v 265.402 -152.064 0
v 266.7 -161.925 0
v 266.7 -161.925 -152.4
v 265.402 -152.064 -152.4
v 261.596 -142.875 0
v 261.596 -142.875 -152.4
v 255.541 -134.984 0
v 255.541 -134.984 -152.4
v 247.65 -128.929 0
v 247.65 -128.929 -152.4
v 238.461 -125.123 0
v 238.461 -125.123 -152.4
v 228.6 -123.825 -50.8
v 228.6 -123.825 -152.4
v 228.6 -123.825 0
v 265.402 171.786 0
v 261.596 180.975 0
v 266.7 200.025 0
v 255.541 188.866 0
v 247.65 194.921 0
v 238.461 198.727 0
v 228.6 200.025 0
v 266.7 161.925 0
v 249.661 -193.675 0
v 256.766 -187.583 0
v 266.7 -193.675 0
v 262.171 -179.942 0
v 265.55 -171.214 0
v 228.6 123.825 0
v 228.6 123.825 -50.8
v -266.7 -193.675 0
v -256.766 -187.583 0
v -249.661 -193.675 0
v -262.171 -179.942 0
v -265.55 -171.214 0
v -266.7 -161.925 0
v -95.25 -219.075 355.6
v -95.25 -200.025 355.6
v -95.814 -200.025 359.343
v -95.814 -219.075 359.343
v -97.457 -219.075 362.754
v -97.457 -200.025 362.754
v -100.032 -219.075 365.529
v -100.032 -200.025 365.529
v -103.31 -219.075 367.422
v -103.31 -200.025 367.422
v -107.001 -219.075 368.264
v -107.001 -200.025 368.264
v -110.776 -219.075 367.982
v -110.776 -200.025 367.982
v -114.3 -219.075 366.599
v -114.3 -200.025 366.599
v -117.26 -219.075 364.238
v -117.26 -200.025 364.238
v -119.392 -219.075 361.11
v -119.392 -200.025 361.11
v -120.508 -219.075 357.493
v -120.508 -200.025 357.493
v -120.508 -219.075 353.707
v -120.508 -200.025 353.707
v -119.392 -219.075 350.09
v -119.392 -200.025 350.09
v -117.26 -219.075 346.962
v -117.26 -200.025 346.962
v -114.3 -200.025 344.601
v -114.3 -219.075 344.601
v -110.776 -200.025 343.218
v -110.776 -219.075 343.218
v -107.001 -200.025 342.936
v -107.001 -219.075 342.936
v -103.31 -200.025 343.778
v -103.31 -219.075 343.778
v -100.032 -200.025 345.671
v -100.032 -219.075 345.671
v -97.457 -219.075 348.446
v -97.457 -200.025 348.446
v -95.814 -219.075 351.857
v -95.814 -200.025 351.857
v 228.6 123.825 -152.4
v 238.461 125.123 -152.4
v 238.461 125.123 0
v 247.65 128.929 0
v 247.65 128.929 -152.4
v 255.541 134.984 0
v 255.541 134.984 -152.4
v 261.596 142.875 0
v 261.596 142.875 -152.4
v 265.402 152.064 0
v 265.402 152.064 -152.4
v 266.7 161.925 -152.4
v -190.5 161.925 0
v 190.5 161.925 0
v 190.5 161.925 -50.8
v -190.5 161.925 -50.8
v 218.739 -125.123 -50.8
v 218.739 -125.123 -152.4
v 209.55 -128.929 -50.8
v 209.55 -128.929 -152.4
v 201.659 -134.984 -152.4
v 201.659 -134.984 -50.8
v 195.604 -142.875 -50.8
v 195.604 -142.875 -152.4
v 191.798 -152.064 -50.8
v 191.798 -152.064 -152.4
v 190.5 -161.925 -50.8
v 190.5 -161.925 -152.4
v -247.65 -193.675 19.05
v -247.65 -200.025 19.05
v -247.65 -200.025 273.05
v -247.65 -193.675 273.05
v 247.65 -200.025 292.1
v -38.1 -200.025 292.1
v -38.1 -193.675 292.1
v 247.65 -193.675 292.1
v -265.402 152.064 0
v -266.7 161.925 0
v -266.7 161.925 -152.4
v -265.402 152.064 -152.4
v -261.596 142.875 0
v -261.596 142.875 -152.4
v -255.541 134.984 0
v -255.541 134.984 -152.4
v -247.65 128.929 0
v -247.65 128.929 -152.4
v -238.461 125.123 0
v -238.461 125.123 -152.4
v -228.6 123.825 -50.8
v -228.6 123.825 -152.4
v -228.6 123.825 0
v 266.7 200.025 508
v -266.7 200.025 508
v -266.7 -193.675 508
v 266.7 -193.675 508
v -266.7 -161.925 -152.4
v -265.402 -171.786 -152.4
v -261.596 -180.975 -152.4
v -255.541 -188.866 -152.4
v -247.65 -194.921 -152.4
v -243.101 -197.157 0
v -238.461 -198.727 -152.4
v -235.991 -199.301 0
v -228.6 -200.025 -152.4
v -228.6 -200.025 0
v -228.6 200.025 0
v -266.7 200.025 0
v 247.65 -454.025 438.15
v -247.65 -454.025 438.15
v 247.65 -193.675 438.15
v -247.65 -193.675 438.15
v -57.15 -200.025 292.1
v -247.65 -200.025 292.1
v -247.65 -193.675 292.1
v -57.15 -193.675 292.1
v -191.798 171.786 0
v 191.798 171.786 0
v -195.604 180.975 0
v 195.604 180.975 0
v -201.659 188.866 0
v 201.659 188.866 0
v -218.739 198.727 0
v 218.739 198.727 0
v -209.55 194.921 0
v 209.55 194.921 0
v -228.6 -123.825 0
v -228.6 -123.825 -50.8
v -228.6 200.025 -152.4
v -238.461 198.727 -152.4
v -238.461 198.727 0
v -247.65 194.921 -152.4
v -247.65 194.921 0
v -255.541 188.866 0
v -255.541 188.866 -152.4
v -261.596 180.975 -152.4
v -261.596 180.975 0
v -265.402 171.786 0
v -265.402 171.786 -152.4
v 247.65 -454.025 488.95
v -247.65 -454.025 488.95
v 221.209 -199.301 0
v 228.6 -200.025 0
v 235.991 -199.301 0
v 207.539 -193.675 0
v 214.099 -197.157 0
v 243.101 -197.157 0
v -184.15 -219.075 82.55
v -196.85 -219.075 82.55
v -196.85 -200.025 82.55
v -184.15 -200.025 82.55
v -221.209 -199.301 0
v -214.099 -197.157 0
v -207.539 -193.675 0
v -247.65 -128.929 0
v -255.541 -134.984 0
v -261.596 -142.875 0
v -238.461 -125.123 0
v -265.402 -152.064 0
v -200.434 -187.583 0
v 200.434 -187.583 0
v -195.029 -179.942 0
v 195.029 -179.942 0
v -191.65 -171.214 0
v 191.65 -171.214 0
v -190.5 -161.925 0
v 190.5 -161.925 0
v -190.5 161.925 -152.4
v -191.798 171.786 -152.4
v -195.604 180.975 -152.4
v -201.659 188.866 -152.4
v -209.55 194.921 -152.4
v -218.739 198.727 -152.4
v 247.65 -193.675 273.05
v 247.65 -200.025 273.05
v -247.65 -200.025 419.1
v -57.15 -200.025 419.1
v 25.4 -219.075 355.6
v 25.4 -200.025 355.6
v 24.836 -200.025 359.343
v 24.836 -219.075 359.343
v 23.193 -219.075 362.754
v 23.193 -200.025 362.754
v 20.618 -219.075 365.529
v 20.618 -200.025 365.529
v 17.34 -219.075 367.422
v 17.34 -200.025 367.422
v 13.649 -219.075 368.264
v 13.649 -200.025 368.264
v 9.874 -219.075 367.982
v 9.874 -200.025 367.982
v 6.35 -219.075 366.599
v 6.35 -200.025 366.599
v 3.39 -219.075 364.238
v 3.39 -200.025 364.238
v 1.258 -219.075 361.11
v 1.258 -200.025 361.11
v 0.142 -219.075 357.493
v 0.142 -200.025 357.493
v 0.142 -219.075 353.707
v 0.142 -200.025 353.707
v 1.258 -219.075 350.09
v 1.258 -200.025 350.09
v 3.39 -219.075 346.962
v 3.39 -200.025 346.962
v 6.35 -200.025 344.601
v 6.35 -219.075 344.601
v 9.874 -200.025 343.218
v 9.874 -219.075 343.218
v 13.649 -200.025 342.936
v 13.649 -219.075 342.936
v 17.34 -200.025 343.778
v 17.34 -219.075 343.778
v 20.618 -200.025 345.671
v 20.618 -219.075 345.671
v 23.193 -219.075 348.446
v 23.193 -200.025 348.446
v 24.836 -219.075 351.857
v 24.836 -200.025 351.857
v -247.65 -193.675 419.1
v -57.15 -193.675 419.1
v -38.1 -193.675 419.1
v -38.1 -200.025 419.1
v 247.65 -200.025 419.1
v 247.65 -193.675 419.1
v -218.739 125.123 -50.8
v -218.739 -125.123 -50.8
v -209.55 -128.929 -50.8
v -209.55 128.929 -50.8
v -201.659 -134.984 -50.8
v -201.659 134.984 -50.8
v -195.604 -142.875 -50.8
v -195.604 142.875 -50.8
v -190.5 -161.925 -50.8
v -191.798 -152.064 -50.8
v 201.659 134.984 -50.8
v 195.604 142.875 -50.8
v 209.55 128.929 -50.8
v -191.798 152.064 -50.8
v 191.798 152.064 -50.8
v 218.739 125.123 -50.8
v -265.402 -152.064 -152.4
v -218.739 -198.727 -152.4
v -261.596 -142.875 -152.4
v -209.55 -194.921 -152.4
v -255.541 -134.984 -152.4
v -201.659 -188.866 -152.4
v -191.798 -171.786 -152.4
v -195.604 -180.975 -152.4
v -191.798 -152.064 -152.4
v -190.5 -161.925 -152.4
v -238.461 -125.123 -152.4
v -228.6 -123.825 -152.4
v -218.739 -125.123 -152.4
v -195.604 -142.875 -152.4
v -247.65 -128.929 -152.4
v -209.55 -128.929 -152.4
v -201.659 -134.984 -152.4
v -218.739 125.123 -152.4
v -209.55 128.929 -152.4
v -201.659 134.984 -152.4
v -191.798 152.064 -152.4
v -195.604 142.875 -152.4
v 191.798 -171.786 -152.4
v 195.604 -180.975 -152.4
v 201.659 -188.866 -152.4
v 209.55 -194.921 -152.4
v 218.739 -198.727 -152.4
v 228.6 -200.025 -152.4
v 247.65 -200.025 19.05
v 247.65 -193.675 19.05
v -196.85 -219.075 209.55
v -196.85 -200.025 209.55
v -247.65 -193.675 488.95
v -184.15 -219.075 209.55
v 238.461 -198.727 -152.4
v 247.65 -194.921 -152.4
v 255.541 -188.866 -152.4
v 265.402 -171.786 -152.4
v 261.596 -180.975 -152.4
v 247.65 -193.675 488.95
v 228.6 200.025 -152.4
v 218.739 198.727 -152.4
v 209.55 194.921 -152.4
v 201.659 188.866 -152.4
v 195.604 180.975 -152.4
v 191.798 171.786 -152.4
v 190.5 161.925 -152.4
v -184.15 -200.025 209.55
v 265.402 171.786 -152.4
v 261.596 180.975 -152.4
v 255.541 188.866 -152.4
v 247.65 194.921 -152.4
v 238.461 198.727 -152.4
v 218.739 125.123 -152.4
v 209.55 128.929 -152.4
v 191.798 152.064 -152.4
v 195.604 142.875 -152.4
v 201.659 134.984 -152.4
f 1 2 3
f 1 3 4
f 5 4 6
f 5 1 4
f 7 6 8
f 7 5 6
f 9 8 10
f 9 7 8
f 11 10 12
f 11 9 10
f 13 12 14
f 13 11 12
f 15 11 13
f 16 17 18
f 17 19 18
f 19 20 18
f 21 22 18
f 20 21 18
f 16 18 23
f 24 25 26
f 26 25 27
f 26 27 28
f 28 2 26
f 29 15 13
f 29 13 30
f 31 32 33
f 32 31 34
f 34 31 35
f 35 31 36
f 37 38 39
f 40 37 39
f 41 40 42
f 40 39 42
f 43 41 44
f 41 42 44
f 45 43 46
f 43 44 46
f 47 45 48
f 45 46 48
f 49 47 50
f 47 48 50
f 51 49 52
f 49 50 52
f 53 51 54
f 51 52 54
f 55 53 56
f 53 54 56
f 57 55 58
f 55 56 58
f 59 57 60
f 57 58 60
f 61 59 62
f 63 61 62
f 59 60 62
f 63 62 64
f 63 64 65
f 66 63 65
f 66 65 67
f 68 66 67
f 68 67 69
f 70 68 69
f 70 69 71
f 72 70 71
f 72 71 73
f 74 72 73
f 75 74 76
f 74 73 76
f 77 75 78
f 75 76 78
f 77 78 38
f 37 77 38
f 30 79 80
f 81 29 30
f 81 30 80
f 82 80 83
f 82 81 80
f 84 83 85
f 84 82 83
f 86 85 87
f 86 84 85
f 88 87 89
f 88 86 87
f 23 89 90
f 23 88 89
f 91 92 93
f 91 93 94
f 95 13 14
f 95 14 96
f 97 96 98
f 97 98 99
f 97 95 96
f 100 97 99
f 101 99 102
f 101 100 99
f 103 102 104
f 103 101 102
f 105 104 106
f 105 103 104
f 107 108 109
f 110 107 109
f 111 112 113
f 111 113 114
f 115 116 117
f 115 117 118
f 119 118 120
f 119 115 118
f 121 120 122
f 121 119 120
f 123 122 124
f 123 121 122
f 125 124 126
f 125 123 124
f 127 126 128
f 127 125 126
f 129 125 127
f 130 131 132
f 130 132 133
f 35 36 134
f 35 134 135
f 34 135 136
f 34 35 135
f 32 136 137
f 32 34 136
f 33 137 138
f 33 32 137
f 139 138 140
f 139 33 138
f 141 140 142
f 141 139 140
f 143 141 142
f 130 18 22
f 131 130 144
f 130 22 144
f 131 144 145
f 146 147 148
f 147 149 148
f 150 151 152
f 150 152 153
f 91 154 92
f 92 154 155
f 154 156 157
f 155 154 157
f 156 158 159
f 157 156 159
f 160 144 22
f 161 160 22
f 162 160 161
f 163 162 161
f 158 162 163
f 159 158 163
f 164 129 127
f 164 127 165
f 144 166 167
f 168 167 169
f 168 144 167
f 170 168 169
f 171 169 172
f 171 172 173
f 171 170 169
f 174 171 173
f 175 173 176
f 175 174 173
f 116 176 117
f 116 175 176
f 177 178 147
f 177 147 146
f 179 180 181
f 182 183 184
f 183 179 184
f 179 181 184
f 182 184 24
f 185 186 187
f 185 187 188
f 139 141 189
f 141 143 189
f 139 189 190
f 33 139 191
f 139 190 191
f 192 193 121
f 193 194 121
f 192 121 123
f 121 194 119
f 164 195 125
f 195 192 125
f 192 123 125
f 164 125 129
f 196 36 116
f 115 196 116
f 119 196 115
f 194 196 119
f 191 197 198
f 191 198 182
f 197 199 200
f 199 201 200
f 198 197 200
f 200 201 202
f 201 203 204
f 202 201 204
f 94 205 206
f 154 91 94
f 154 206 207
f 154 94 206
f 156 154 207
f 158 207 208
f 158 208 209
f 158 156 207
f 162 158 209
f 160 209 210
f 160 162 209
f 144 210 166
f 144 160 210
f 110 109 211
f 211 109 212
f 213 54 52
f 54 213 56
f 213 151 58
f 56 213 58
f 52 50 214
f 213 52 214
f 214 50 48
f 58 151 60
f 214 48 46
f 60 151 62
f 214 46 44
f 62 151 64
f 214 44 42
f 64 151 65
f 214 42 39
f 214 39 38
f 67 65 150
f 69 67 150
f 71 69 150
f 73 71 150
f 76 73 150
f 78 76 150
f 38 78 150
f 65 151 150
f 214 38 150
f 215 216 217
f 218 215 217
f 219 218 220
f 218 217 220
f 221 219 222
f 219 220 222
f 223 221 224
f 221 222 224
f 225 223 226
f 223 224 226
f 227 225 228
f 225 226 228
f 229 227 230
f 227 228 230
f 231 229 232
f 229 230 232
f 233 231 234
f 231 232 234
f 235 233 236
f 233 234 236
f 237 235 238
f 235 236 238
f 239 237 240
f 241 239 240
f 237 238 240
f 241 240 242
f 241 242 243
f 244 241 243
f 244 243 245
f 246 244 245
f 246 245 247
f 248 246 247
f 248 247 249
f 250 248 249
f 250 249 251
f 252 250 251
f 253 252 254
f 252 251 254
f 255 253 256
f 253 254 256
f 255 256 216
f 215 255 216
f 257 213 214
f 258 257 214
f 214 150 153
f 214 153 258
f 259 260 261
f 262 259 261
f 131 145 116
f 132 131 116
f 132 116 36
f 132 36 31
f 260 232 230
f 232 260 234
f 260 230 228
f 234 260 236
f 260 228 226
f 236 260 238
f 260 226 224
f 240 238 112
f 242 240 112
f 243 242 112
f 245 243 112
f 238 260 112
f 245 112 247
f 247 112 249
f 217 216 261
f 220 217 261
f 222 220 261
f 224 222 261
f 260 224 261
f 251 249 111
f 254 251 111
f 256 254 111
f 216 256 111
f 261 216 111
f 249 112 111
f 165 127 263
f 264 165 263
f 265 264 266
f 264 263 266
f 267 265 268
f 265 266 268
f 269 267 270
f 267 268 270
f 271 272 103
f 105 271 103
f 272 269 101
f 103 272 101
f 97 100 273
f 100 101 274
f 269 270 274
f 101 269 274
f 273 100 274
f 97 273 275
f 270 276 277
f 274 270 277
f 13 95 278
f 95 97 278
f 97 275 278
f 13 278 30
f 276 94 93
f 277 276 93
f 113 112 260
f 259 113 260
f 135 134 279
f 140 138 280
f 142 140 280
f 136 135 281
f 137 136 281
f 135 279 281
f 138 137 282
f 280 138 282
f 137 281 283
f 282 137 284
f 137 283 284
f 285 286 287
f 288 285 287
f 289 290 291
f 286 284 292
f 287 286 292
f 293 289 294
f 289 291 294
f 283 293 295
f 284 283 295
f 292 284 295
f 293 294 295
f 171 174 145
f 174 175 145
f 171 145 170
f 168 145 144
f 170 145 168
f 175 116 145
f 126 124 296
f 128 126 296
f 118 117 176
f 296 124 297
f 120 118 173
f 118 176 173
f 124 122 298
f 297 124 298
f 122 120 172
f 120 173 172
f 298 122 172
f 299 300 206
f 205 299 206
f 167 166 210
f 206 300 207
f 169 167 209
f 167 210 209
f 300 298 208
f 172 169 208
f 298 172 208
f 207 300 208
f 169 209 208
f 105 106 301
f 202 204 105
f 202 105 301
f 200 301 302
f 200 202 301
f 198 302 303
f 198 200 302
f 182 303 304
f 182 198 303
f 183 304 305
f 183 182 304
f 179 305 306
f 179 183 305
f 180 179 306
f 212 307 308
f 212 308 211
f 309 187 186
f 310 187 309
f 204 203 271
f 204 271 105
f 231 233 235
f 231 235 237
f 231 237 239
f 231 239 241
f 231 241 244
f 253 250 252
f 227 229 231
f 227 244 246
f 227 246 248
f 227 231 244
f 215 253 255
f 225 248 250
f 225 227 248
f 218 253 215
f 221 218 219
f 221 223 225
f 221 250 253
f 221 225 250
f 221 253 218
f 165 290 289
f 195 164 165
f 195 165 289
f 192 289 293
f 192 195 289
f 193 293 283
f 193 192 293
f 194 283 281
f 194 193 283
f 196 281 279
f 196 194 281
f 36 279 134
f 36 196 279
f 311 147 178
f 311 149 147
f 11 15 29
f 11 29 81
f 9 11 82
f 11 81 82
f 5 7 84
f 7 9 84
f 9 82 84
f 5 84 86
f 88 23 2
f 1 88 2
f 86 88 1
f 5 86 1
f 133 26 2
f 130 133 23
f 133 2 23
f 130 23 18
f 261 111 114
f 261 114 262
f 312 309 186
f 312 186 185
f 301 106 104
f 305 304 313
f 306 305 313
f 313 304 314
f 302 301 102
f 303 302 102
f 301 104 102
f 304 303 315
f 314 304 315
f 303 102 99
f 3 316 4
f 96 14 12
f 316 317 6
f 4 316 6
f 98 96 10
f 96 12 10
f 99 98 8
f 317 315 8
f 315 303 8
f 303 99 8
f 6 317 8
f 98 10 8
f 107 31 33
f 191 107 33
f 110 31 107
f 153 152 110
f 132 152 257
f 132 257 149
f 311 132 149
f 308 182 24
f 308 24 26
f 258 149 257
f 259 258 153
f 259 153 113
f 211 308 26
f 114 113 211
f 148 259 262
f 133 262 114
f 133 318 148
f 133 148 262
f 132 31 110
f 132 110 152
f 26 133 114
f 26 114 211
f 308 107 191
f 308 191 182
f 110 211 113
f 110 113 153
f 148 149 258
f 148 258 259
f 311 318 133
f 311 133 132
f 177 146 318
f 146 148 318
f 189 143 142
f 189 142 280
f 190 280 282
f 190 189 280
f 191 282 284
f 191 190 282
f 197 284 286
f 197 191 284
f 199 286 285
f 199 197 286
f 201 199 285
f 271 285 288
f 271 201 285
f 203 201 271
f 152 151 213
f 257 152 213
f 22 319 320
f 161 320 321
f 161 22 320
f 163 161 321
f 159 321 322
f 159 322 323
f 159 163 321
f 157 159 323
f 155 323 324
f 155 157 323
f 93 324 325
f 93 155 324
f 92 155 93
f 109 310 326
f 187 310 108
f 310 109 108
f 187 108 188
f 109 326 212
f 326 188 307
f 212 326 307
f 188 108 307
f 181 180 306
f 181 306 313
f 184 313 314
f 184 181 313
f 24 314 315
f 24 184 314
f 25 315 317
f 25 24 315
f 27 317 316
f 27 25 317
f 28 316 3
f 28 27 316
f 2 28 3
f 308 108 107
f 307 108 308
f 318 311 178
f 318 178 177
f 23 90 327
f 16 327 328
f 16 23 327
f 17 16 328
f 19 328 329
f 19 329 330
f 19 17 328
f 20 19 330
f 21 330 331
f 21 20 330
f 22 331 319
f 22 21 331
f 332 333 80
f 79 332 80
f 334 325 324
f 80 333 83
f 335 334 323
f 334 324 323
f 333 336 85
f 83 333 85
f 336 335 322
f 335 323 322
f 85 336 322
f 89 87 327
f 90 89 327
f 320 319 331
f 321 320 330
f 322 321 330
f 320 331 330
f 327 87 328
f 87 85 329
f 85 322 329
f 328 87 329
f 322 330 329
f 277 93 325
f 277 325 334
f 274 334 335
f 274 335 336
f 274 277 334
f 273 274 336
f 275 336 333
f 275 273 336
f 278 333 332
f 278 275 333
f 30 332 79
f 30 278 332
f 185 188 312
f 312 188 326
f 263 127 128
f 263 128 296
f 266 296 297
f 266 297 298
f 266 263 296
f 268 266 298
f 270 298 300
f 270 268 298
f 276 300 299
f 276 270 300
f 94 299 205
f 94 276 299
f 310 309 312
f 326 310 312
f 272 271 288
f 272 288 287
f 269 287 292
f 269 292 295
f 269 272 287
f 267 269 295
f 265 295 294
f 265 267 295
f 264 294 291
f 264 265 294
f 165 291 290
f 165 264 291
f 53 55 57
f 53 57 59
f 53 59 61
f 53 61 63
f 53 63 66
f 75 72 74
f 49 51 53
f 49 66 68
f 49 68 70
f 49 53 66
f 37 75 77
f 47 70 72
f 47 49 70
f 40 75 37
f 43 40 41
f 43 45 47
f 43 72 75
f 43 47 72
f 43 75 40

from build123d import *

# Parameters (mm, degrees)
F1_DEPTH = 50.8
F2_DEPTH = 152.4
F3_DEPTH = 508
F4_W     = 495.3
F4_H     = 254
F4_W_2   = 190.5
F4_H_2   = 127
F4_W_3   = 285.75
F4_H_3   = 50.8
F5_DEPTH = 6.35
F6_DEPTH = 254
F4_W_4   = 12.7
F4_R     = 12.7
F7_DEPTH = 19.05


with BuildPart() as f1:
    # F0 (on Top) → F1 (new body)
    with BuildSketch(Plane.XY):
        with BuildLine():
            ThreePointArc((228.6, 123.825), (201.6592316368, 134.9842316368), (190.5, 161.925))
            Line((190.5, 161.925), (-190.5, 161.925))
            ThreePointArc((-190.5, 161.925), (-201.6592316368, 134.9842316368), (-228.6, 123.825))
            Line((-228.6, 123.825), (-228.6, -123.825))
            ThreePointArc((-228.6, -123.825), (-201.6592316368, -134.9842316368), (-190.5, -161.925))
            Line((-190.5, -161.925), (190.5, -161.925))
            ThreePointArc((190.5, -161.925), (201.6592316368, -134.9842316368), (228.6, -123.825))
            Line((228.6, -123.825), (228.6, 123.825))
        make_face()
        with BuildLine():
            ThreePointArc((-228.6, 123.825), (-201.6592316368, 134.9842316368), (-190.5, 161.925))
            Line((-190.5, 161.925), (-228.6, 161.925))
            Line((-228.6, 161.925), (-228.6, 123.825))
        make_face()
        with BuildLine():
            ThreePointArc((-190.5, -161.925), (-201.6592316368, -134.9842316368), (-228.6, -123.825))
            Line((-228.6, -123.825), (-228.6, -161.925))
            Line((-228.6, -161.925), (-190.5, -161.925))
        make_face()
        with BuildLine():
            Line((228.6, -161.925), (228.6, -123.825))
            ThreePointArc((228.6, -123.825), (201.6592316368, -134.9842316368), (190.5, -161.925))
            Line((190.5, -161.925), (228.6, -161.925))
        make_face()
        with BuildLine():
            Line((228.6, 161.925), (190.5, 161.925))
            ThreePointArc((190.5, 161.925), (201.6592316368, 134.9842316368), (228.6, 123.825))
            Line((228.6, 123.825), (228.6, 161.925))
        make_face()
    extrude(amount=-F1_DEPTH)

    # F0 (on Top) → F2 (join)
    with BuildSketch(Plane.XY):
        with BuildLine():
            ThreePointArc((-228.6, -123.825), (-255.5407683632, -134.9842316368), (-266.7, -161.925))
            ThreePointArc((-266.7, -161.925), (-255.540768159, -188.8657685674), (-228.5999994224, -200.025))
            ThreePointArc((-228.5999994224, -200.025), (-201.6592314326, -188.865768159), (-190.5, -161.925))
            Line((-190.5, -161.925), (-228.6, -161.925))
            Line((-228.6, -161.925), (-228.6, -123.825))
        make_face()
        with BuildLine():
            ThreePointArc((-190.5, -161.925), (-201.6592316368, -134.9842316368), (-228.6, -123.825))
            Line((-228.6, -123.825), (-228.6, -161.925))
            Line((-228.6, -161.925), (-190.5, -161.925))
        make_face()
        with BuildLine():
            ThreePointArc((-228.6, 123.825), (-201.6592316368, 134.9842316368), (-190.5, 161.925))
            Line((-190.5, 161.925), (-228.6, 161.925))
            Line((-228.6, 161.925), (-228.6, 123.825))
        make_face()
        with BuildLine():
            ThreePointArc((-190.5, 161.925), (-201.6592316368, 188.8657683632), (-228.6, 200.025))
            ThreePointArc((-228.6, 200.025), (-255.5407683632, 188.8657683632), (-266.7, 161.925))
            ThreePointArc((-266.7, 161.925), (-255.5407683632, 134.9842316368), (-228.6, 123.825))
            Line((-228.6, 123.825), (-228.6, 161.925))
            Line((-228.6, 161.925), (-190.5, 161.925))
        make_face()
        with BuildLine():
            Line((228.6, 161.925), (190.5, 161.925))
            ThreePointArc((190.5, 161.925), (201.6592316368, 134.9842316368), (228.6, 123.825))
            Line((228.6, 123.825), (228.6, 161.925))
        make_face()
        with BuildLine():
            ThreePointArc((266.7, 161.925), (255.5407683632, 188.8657683632), (228.6, 200.025))
            ThreePointArc((228.6, 200.025), (201.6592316368, 188.8657683632), (190.5, 161.925))
            Line((190.5, 161.925), (228.6, 161.925))
            Line((228.6, 161.925), (228.6, 123.825))
            ThreePointArc((228.6, 123.825), (255.5407683632, 134.9842316368), (266.7, 161.925))
        make_face()
        with BuildLine():
            Line((228.6, -161.925), (228.6, -123.825))
            ThreePointArc((228.6, -123.825), (201.6592316368, -134.9842316368), (190.5, -161.925))
            Line((190.5, -161.925), (228.6, -161.925))
        make_face()
        with BuildLine():
            ThreePointArc((228.6, -200.025), (255.5407683632, -188.8657683632), (266.7, -161.925))
            ThreePointArc((266.7, -161.925), (255.5407683632, -134.9842316368), (228.6, -123.825))
            Line((228.6, -123.825), (228.6, -161.925))
            Line((228.6, -161.925), (190.5, -161.925))
            ThreePointArc((190.5, -161.925), (201.6592316368, -188.8657683632), (228.6, -200.025))
        make_face()
    extrude(amount=-F2_DEPTH)

    # F0 (on Top) → F3 (join)
    with BuildSketch(Plane.XY):
        with BuildLine():
            ThreePointArc((-228.6, 123.825), (-255.5407683632, 134.9842316368), (-266.7, 161.925))
            Line((-266.7, 161.925), (-266.7, -161.925))
            ThreePointArc((-266.7, -161.925), (-255.5407683632, -134.9842316368), (-228.6, -123.825))
            Line((-228.6, -123.825), (-228.6, 123.825))
        make_face()
        with BuildLine():
            ThreePointArc((-266.7, 161.925), (-255.5407683632, 188.8657683632), (-228.6, 200.025))
            Line((-228.6, 200.025), (-266.7, 200.025))
            Line((-266.7, 200.025), (-266.7, 161.925))
        make_face()
        with BuildLine():
            ThreePointArc((-190.5, 161.925), (-201.6592316368, 188.8657683632), (-228.6, 200.025))
            ThreePointArc((-228.6, 200.025), (-255.5407683632, 188.8657683632), (-266.7, 161.925))
            ThreePointArc((-266.7, 161.925), (-255.5407683632, 134.9842316368), (-228.6, 123.825))
            Line((-228.6, 123.825), (-228.6, 161.925))
            Line((-228.6, 161.925), (-190.5, 161.925))
        make_face()
        with BuildLine():
            ThreePointArc((-228.6, 123.825), (-201.6592316368, 134.9842316368), (-190.5, 161.925))
            Line((-190.5, 161.925), (-228.6, 161.925))
            Line((-228.6, 161.925), (-228.6, 123.825))
        make_face()
        with BuildLine():
            ThreePointArc((228.6, 123.825), (201.6592316368, 134.9842316368), (190.5, 161.925))
            Line((190.5, 161.925), (-190.5, 161.925))
            ThreePointArc((-190.5, 161.925), (-201.6592316368, 134.9842316368), (-228.6, 123.825))
            Line((-228.6, 123.825), (-228.6, -123.825))
            ThreePointArc((-228.6, -123.825), (-201.6592316368, -134.9842316368), (-190.5, -161.925))
            Line((-190.5, -161.925), (190.5, -161.925))
            ThreePointArc((190.5, -161.925), (201.6592316368, -134.9842316368), (228.6, -123.825))
            Line((228.6, -123.825), (228.6, 123.825))
        make_face()
        with BuildLine():
            ThreePointArc((-190.5, -161.925), (-201.6592316368, -134.9842316368), (-228.6, -123.825))
            Line((-228.6, -123.825), (-228.6, -161.925))
            Line((-228.6, -161.925), (-190.5, -161.925))
        make_face()
        with BuildLine():
            ThreePointArc((-228.6, -123.825), (-255.5407683632, -134.9842316368), (-266.7, -161.925))
            ThreePointArc((-266.7, -161.925), (-255.540768159, -188.8657685674), (-228.5999994224, -200.025))
            ThreePointArc((-228.5999994224, -200.025), (-201.6592314326, -188.865768159), (-190.5, -161.925))
            Line((-190.5, -161.925), (-228.6, -161.925))
            Line((-228.6, -161.925), (-228.6, -123.825))
        make_face()
        with BuildLine():
            ThreePointArc((-228.5999994224, -200.025), (-255.540768159, -188.8657685674), (-266.7, -161.925))
            Line((-266.7, -161.925), (-266.7, -200.025))
            Line((-266.7, -200.025), (-228.5999994224, -200.025))
        make_face()
        with BuildLine():
            Line((-228.5999994224, -200.025), (228.6, -200.025))
            ThreePointArc((228.6, -200.025), (201.6592316368, -188.8657683632), (190.5, -161.925))
            Line((190.5, -161.925), (-190.5, -161.925))
            ThreePointArc((-190.5, -161.925), (-201.6592314326, -188.865768159), (-228.5999994224, -200.025))
        make_face()
        with BuildLine():
            ThreePointArc((228.6, -200.025), (255.5407683632, -188.8657683632), (266.7, -161.925))
            ThreePointArc((266.7, -161.925), (255.5407683632, -134.9842316368), (228.6, -123.825))
            Line((228.6, -123.825), (228.6, -161.925))
            Line((228.6, -161.925), (190.5, -161.925))
            ThreePointArc((190.5, -161.925), (201.6592316368, -188.8657683632), (228.6, -200.025))
        make_face()
        with BuildLine():
            Line((266.7, -200.025), (266.7, -161.925))
            ThreePointArc((266.7, -161.925), (255.5407683632, -188.8657683632), (228.6, -200.025))
            Line((228.6, -200.025), (266.7, -200.025))
        make_face()
        with BuildLine():
            Line((228.6, -161.925), (228.6, -123.825))
            ThreePointArc((228.6, -123.825), (201.6592316368, -134.9842316368), (190.5, -161.925))
            Line((190.5, -161.925), (228.6, -161.925))
        make_face()
        with BuildLine():
            Line((266.7, -161.925), (266.7, 161.925))
            ThreePointArc((266.7, 161.925), (255.5407683632, 134.9842316368), (228.6, 123.825))
            Line((228.6, 123.825), (228.6, -123.825))
            ThreePointArc((228.6, -123.825), (255.5407683632, -134.9842316368), (266.7, -161.925))
        make_face()
        with BuildLine():
            ThreePointArc((190.5, 161.925), (201.6592316368, 188.8657683632), (228.6, 200.025))
            Line((228.6, 200.025), (-228.6, 200.025))
            ThreePointArc((-228.6, 200.025), (-201.6592316368, 188.8657683632), (-190.5, 161.925))
            Line((-190.5, 161.925), (190.5, 161.925))
        make_face()
        with BuildLine():
            Line((266.7, 161.925), (266.7, 200.025))
            Line((266.7, 200.025), (228.6, 200.025))
            ThreePointArc((228.6, 200.025), (255.5407683632, 188.8657683632), (266.7, 161.925))
        make_face()
        with BuildLine():
            ThreePointArc((266.7, 161.925), (255.5407683632, 188.8657683632), (228.6, 200.025))
            ThreePointArc((228.6, 200.025), (201.6592316368, 188.8657683632), (190.5, 161.925))
            Line((190.5, 161.925), (228.6, 161.925))
            Line((228.6, 161.925), (228.6, 123.825))
            ThreePointArc((228.6, 123.825), (255.5407683632, 134.9842316368), (266.7, 161.925))
        make_face()
        with BuildLine():
            Line((228.6, 161.925), (190.5, 161.925))
            ThreePointArc((190.5, 161.925), (201.6592316368, 134.9842316368), (228.6, 123.825))
            Line((228.6, 123.825), (228.6, 161.925))
        make_face()
    extrude(amount=F3_DEPTH)

    # F4 (on face) → F5 (cut)
    with BuildSketch(Plane.XZ.offset(200.025)):
        Polygon((266.7, 508), (-266.7, 508), (-266.7, 0), (-228.6, 0), (228.6, 0), (266.7, 0), align=None)
        with Locations((0, 146.05)):
            Rectangle(F4_W, F4_H, mode=Mode.SUBTRACT)
        with Locations((-152.4, 355.6)):
            Rectangle(F4_W_2, F4_H_2, mode=Mode.SUBTRACT)
        with Locations((104.775, 355.6)):
            Rectangle(F4_W_3, F4_H_2, mode=Mode.SUBTRACT)
        with Locations((0, 463.55)):
            Rectangle(F4_W, F4_H_3, mode=Mode.SUBTRACT)
    extrude(amount=-F5_DEPTH, mode=Mode.SUBTRACT)

    # F4 (on face) → F6 (join)
    with BuildSketch(Plane.XZ.offset(200.025)):
        with Locations((0, 463.55)):
            Rectangle(F4_W, F4_H_3)
    extrude(amount=F6_DEPTH)

    # F4 (on face) → F7 (join)
    with BuildSketch(Plane.XZ.offset(200.025)):
        with Locations((-190.5, 146.05)):
            Rectangle(F4_W_4, F4_H_2)
        with Locations((-107.95, 355.6)):
            Circle(F4_R)
        with Locations((12.7, 355.6)):
            Circle(F4_R)
    extrude(amount=F7_DEPTH)


solid = f1.part
